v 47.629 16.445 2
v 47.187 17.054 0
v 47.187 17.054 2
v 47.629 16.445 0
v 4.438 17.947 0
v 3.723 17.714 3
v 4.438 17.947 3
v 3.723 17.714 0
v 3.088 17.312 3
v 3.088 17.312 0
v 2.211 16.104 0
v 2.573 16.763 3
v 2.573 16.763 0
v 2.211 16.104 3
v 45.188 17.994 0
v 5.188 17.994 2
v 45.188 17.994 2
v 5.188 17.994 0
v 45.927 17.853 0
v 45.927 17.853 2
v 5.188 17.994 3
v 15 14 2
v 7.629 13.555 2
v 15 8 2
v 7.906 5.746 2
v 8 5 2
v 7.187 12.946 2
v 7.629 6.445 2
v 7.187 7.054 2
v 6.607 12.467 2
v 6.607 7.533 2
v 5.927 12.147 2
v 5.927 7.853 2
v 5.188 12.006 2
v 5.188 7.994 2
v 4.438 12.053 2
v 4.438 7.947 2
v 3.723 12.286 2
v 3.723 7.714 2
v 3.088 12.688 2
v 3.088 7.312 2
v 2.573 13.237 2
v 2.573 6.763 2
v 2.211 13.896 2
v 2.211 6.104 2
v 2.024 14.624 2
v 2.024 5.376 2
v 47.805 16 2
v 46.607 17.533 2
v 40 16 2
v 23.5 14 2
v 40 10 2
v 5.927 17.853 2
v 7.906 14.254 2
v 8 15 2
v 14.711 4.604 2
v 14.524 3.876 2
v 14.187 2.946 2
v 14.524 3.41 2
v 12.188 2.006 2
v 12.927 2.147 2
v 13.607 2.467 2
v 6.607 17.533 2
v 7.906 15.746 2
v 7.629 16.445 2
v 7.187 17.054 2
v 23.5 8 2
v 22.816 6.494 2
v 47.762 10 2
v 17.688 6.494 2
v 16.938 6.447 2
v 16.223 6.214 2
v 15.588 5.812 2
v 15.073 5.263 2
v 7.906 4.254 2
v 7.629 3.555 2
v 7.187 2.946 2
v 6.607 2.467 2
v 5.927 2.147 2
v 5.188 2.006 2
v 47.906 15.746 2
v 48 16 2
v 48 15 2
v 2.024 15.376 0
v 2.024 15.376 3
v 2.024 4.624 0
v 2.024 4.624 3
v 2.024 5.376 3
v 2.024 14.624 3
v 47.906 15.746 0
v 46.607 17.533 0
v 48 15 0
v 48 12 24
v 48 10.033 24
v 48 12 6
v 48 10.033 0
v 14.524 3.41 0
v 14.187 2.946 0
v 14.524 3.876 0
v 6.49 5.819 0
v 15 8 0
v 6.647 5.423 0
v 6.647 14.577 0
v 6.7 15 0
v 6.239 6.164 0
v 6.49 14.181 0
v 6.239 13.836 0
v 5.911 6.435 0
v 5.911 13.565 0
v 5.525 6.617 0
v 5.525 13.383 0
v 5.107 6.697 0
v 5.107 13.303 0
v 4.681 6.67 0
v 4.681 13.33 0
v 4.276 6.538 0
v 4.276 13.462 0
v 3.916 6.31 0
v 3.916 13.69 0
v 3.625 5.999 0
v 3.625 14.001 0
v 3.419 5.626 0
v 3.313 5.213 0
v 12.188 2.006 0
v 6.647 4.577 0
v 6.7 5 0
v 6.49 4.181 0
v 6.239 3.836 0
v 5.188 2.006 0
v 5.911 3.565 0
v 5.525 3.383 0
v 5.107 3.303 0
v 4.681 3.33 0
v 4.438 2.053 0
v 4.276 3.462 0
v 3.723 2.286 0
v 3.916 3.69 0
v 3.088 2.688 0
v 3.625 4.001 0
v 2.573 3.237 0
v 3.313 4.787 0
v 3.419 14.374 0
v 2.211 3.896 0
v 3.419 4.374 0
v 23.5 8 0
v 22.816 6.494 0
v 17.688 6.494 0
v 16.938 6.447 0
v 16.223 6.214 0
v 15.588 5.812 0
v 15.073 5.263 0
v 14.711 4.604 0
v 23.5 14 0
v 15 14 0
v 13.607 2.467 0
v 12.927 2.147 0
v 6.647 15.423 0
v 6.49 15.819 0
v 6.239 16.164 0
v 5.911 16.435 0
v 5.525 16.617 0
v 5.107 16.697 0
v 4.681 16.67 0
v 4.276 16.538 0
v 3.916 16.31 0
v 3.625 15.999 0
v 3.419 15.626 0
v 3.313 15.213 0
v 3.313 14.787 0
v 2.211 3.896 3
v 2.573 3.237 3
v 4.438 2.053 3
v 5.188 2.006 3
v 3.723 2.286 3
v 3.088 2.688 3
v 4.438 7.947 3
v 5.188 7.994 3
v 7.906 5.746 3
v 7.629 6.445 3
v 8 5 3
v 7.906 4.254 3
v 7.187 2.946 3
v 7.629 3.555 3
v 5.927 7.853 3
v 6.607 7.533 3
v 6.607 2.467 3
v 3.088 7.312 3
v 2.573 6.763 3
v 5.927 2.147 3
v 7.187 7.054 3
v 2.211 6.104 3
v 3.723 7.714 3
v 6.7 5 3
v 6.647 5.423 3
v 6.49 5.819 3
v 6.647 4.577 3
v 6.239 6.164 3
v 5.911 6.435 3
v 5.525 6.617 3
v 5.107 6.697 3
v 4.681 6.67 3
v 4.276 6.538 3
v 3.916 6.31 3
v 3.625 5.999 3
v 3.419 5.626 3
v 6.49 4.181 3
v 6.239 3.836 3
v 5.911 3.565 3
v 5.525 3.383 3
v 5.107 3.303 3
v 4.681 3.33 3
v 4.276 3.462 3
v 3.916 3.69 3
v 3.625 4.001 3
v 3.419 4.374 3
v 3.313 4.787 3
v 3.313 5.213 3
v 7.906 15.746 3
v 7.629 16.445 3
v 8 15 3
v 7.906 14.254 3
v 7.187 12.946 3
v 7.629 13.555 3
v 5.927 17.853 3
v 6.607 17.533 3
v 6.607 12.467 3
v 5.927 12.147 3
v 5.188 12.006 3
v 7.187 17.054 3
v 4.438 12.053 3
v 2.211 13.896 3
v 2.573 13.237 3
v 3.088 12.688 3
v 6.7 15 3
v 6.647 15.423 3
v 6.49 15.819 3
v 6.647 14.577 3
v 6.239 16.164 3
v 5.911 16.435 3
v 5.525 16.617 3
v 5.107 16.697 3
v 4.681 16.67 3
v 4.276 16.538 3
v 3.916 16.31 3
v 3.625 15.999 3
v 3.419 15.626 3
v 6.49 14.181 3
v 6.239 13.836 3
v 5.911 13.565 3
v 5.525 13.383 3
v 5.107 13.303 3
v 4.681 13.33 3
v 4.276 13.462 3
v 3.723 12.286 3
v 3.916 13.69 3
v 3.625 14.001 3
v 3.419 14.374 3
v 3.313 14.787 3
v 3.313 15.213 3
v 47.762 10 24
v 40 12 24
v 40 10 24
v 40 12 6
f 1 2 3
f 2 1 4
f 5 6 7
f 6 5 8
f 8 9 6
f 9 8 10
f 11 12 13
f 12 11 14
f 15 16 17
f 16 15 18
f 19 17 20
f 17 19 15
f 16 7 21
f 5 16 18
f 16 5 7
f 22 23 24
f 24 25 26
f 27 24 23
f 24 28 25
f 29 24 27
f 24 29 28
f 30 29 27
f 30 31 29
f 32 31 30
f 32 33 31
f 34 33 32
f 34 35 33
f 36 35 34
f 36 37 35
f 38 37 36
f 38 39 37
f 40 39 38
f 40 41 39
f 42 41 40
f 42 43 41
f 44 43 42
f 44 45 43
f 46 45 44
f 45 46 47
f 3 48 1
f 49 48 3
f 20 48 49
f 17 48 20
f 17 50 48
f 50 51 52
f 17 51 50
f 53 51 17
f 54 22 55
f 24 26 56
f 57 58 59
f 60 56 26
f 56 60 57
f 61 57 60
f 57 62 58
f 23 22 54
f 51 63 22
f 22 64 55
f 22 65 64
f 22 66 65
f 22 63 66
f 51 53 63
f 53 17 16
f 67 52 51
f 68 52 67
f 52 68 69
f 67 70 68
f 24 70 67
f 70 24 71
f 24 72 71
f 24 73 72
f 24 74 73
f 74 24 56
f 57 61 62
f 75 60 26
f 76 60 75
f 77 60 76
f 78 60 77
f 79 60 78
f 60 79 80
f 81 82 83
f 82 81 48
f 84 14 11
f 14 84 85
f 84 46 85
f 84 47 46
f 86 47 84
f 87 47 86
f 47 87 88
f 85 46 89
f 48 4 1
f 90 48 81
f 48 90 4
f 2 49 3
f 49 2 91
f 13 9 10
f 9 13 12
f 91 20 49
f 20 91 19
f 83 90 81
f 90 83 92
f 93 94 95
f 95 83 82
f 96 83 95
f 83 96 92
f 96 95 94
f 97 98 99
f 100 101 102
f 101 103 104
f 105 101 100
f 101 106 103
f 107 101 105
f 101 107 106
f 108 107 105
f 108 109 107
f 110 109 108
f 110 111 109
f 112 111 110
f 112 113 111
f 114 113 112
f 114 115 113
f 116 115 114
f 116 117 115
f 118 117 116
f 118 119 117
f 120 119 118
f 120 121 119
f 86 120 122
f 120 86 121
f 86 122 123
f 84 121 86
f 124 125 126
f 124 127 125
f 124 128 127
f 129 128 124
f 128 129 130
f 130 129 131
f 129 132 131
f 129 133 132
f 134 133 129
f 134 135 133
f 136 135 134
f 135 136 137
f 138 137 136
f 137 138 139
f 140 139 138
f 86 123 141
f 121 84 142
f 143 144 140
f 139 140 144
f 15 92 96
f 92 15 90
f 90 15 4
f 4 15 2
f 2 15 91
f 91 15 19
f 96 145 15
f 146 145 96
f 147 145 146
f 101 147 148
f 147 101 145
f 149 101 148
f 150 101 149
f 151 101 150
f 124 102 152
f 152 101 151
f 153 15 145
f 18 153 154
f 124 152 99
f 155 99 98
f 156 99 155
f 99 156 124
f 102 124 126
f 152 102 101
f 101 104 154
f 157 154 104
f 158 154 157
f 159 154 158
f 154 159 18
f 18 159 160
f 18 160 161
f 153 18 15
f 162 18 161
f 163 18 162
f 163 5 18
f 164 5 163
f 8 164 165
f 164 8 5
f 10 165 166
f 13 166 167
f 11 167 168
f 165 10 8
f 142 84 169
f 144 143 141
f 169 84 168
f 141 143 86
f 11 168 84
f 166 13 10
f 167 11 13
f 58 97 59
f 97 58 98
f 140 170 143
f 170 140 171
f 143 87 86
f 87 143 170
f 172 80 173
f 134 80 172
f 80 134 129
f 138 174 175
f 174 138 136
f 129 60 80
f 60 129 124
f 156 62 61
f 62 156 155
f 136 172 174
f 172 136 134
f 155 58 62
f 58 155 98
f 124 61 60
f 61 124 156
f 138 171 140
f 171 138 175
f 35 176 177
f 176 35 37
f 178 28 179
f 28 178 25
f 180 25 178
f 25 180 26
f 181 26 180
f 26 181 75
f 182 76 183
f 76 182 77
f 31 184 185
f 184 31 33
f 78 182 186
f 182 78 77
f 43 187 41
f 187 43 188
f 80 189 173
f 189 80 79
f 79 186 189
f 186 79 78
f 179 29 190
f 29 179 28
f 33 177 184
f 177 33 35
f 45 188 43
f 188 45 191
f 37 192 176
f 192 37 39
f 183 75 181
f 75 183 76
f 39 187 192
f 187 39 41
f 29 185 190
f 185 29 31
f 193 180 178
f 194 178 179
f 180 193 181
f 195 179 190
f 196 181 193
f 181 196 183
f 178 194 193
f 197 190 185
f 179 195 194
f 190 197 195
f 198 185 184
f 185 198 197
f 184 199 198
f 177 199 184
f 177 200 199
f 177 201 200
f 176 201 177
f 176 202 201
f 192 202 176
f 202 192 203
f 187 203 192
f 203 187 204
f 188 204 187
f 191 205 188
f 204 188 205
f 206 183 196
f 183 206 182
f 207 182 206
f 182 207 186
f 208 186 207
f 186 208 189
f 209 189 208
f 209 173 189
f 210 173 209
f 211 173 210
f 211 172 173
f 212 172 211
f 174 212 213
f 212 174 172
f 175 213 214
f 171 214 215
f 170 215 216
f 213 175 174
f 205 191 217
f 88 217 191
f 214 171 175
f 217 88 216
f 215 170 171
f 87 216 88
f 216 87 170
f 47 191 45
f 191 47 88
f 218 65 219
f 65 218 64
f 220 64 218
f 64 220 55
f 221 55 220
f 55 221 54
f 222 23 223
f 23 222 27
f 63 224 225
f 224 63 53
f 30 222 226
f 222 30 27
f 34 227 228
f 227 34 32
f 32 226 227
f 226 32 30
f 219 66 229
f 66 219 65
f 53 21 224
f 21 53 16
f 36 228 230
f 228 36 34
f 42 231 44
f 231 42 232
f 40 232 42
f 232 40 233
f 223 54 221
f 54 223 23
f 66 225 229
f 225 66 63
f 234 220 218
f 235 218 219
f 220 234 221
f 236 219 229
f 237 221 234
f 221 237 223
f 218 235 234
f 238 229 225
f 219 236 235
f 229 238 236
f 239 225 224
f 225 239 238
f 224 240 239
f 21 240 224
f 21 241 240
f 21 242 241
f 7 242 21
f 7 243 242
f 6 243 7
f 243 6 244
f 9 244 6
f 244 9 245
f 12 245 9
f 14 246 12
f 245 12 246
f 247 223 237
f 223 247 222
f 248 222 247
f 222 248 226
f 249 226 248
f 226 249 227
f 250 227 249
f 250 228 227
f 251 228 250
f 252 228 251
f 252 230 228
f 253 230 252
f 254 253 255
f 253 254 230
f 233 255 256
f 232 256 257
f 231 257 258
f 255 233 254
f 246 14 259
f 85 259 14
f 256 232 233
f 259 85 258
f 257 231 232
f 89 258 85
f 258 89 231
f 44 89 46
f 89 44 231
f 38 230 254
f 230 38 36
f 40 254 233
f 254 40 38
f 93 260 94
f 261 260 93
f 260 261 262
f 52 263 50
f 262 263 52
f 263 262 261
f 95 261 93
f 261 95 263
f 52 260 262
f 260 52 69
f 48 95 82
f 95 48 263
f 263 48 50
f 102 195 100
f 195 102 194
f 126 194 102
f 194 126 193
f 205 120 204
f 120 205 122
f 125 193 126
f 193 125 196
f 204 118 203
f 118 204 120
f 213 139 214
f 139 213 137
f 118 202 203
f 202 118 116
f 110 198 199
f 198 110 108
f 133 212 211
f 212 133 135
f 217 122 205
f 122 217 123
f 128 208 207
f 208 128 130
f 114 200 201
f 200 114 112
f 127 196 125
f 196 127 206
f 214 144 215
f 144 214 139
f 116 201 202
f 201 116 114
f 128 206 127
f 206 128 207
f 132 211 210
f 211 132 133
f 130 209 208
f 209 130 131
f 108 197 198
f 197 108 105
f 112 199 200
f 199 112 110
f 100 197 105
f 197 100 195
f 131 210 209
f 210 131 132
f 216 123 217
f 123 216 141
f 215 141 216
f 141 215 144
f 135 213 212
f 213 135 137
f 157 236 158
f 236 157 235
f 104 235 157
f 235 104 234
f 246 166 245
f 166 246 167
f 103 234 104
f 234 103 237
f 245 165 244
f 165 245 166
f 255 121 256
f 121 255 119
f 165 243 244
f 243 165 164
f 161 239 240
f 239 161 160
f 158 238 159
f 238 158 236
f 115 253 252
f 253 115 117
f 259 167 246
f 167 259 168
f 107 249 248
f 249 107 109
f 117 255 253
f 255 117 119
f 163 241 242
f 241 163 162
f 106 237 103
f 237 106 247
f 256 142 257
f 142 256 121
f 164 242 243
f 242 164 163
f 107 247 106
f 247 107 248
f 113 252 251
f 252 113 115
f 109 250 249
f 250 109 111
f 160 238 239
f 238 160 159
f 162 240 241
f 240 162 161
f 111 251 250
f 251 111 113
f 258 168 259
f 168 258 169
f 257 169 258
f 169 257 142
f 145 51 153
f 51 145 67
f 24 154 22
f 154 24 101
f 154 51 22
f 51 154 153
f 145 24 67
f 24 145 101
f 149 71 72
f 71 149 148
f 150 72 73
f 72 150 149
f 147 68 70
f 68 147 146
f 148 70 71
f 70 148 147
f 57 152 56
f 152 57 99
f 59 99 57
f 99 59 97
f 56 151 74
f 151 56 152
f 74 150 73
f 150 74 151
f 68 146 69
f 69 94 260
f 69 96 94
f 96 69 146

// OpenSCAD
// X-axis homing target for dc42's modulated IR

$fn=25;
thickness = 2;


difference() {
	union() {

		//Upper and lower part of "body"		
		translate([25,12,0]) roundedRect([43,9,thickness], 3);
		translate([8.5,7,0]) roundedRect([10,7,thickness], 3);


		//Screw hole extensions
		translate([5,5,thickness]) cylinder(h=1,r=3);
		translate([5,15,thickness]) cylinder(h=1,r=3);


		 //Filler for lower corner lower part
		translate([15,2,0]) cube([10,10,thickness]);

		//Arm
		translate([40,12-thickness,thickness]) cube([8,thickness,22]);

		//Arm support
		translate([48,12,thickness]) rotate([0,-90,0]) linear_extrude(height=8,convexity=2)
			polygon(points=[[0,0],[0,4],[4,0]], paths=[[0,1,2]]);
	}

	//Screw holes
	translate([5,5,-1]) cylinder(h=thickness+3,r=1.7);
	translate([5,15,-1]) cylinder(h=thickness+3,r=1.7);

	//Square hole
	translate([15,8,-1]) cube([8.5,6,thickness+2]);

	//Cutout for lower inner corner
	translate([36,2,-1]) roundedRect([40,6,thickness+2],3);

	//Cutout to make arm more narrow
	translate([20,-4,-1]) rotate([0,0,8]) cube([30,10,50]);
	
}

module roundedRect(size, radius)
{
	x = size[0];
	y = size[1];
	z = size[2];

	linear_extrude(height=z)
	hull()
	{
		// place 4 circles in the corners, with the given radius
		translate([(-x/2)+(radius/2), (-y/2)+(radius/2), 0])
		circle(r=radius);
	
		translate([(x/2)-(radius/2), (-y/2)+(radius/2), 0])
		circle(r=radius);
	
		translate([(-x/2)+(radius/2), (y/2)-(radius/2), 0])
		circle(r=radius);
	
		translate([(x/2)-(radius/2), (y/2)-(radius/2), 0])
		circle(r=radius);
	}
}
